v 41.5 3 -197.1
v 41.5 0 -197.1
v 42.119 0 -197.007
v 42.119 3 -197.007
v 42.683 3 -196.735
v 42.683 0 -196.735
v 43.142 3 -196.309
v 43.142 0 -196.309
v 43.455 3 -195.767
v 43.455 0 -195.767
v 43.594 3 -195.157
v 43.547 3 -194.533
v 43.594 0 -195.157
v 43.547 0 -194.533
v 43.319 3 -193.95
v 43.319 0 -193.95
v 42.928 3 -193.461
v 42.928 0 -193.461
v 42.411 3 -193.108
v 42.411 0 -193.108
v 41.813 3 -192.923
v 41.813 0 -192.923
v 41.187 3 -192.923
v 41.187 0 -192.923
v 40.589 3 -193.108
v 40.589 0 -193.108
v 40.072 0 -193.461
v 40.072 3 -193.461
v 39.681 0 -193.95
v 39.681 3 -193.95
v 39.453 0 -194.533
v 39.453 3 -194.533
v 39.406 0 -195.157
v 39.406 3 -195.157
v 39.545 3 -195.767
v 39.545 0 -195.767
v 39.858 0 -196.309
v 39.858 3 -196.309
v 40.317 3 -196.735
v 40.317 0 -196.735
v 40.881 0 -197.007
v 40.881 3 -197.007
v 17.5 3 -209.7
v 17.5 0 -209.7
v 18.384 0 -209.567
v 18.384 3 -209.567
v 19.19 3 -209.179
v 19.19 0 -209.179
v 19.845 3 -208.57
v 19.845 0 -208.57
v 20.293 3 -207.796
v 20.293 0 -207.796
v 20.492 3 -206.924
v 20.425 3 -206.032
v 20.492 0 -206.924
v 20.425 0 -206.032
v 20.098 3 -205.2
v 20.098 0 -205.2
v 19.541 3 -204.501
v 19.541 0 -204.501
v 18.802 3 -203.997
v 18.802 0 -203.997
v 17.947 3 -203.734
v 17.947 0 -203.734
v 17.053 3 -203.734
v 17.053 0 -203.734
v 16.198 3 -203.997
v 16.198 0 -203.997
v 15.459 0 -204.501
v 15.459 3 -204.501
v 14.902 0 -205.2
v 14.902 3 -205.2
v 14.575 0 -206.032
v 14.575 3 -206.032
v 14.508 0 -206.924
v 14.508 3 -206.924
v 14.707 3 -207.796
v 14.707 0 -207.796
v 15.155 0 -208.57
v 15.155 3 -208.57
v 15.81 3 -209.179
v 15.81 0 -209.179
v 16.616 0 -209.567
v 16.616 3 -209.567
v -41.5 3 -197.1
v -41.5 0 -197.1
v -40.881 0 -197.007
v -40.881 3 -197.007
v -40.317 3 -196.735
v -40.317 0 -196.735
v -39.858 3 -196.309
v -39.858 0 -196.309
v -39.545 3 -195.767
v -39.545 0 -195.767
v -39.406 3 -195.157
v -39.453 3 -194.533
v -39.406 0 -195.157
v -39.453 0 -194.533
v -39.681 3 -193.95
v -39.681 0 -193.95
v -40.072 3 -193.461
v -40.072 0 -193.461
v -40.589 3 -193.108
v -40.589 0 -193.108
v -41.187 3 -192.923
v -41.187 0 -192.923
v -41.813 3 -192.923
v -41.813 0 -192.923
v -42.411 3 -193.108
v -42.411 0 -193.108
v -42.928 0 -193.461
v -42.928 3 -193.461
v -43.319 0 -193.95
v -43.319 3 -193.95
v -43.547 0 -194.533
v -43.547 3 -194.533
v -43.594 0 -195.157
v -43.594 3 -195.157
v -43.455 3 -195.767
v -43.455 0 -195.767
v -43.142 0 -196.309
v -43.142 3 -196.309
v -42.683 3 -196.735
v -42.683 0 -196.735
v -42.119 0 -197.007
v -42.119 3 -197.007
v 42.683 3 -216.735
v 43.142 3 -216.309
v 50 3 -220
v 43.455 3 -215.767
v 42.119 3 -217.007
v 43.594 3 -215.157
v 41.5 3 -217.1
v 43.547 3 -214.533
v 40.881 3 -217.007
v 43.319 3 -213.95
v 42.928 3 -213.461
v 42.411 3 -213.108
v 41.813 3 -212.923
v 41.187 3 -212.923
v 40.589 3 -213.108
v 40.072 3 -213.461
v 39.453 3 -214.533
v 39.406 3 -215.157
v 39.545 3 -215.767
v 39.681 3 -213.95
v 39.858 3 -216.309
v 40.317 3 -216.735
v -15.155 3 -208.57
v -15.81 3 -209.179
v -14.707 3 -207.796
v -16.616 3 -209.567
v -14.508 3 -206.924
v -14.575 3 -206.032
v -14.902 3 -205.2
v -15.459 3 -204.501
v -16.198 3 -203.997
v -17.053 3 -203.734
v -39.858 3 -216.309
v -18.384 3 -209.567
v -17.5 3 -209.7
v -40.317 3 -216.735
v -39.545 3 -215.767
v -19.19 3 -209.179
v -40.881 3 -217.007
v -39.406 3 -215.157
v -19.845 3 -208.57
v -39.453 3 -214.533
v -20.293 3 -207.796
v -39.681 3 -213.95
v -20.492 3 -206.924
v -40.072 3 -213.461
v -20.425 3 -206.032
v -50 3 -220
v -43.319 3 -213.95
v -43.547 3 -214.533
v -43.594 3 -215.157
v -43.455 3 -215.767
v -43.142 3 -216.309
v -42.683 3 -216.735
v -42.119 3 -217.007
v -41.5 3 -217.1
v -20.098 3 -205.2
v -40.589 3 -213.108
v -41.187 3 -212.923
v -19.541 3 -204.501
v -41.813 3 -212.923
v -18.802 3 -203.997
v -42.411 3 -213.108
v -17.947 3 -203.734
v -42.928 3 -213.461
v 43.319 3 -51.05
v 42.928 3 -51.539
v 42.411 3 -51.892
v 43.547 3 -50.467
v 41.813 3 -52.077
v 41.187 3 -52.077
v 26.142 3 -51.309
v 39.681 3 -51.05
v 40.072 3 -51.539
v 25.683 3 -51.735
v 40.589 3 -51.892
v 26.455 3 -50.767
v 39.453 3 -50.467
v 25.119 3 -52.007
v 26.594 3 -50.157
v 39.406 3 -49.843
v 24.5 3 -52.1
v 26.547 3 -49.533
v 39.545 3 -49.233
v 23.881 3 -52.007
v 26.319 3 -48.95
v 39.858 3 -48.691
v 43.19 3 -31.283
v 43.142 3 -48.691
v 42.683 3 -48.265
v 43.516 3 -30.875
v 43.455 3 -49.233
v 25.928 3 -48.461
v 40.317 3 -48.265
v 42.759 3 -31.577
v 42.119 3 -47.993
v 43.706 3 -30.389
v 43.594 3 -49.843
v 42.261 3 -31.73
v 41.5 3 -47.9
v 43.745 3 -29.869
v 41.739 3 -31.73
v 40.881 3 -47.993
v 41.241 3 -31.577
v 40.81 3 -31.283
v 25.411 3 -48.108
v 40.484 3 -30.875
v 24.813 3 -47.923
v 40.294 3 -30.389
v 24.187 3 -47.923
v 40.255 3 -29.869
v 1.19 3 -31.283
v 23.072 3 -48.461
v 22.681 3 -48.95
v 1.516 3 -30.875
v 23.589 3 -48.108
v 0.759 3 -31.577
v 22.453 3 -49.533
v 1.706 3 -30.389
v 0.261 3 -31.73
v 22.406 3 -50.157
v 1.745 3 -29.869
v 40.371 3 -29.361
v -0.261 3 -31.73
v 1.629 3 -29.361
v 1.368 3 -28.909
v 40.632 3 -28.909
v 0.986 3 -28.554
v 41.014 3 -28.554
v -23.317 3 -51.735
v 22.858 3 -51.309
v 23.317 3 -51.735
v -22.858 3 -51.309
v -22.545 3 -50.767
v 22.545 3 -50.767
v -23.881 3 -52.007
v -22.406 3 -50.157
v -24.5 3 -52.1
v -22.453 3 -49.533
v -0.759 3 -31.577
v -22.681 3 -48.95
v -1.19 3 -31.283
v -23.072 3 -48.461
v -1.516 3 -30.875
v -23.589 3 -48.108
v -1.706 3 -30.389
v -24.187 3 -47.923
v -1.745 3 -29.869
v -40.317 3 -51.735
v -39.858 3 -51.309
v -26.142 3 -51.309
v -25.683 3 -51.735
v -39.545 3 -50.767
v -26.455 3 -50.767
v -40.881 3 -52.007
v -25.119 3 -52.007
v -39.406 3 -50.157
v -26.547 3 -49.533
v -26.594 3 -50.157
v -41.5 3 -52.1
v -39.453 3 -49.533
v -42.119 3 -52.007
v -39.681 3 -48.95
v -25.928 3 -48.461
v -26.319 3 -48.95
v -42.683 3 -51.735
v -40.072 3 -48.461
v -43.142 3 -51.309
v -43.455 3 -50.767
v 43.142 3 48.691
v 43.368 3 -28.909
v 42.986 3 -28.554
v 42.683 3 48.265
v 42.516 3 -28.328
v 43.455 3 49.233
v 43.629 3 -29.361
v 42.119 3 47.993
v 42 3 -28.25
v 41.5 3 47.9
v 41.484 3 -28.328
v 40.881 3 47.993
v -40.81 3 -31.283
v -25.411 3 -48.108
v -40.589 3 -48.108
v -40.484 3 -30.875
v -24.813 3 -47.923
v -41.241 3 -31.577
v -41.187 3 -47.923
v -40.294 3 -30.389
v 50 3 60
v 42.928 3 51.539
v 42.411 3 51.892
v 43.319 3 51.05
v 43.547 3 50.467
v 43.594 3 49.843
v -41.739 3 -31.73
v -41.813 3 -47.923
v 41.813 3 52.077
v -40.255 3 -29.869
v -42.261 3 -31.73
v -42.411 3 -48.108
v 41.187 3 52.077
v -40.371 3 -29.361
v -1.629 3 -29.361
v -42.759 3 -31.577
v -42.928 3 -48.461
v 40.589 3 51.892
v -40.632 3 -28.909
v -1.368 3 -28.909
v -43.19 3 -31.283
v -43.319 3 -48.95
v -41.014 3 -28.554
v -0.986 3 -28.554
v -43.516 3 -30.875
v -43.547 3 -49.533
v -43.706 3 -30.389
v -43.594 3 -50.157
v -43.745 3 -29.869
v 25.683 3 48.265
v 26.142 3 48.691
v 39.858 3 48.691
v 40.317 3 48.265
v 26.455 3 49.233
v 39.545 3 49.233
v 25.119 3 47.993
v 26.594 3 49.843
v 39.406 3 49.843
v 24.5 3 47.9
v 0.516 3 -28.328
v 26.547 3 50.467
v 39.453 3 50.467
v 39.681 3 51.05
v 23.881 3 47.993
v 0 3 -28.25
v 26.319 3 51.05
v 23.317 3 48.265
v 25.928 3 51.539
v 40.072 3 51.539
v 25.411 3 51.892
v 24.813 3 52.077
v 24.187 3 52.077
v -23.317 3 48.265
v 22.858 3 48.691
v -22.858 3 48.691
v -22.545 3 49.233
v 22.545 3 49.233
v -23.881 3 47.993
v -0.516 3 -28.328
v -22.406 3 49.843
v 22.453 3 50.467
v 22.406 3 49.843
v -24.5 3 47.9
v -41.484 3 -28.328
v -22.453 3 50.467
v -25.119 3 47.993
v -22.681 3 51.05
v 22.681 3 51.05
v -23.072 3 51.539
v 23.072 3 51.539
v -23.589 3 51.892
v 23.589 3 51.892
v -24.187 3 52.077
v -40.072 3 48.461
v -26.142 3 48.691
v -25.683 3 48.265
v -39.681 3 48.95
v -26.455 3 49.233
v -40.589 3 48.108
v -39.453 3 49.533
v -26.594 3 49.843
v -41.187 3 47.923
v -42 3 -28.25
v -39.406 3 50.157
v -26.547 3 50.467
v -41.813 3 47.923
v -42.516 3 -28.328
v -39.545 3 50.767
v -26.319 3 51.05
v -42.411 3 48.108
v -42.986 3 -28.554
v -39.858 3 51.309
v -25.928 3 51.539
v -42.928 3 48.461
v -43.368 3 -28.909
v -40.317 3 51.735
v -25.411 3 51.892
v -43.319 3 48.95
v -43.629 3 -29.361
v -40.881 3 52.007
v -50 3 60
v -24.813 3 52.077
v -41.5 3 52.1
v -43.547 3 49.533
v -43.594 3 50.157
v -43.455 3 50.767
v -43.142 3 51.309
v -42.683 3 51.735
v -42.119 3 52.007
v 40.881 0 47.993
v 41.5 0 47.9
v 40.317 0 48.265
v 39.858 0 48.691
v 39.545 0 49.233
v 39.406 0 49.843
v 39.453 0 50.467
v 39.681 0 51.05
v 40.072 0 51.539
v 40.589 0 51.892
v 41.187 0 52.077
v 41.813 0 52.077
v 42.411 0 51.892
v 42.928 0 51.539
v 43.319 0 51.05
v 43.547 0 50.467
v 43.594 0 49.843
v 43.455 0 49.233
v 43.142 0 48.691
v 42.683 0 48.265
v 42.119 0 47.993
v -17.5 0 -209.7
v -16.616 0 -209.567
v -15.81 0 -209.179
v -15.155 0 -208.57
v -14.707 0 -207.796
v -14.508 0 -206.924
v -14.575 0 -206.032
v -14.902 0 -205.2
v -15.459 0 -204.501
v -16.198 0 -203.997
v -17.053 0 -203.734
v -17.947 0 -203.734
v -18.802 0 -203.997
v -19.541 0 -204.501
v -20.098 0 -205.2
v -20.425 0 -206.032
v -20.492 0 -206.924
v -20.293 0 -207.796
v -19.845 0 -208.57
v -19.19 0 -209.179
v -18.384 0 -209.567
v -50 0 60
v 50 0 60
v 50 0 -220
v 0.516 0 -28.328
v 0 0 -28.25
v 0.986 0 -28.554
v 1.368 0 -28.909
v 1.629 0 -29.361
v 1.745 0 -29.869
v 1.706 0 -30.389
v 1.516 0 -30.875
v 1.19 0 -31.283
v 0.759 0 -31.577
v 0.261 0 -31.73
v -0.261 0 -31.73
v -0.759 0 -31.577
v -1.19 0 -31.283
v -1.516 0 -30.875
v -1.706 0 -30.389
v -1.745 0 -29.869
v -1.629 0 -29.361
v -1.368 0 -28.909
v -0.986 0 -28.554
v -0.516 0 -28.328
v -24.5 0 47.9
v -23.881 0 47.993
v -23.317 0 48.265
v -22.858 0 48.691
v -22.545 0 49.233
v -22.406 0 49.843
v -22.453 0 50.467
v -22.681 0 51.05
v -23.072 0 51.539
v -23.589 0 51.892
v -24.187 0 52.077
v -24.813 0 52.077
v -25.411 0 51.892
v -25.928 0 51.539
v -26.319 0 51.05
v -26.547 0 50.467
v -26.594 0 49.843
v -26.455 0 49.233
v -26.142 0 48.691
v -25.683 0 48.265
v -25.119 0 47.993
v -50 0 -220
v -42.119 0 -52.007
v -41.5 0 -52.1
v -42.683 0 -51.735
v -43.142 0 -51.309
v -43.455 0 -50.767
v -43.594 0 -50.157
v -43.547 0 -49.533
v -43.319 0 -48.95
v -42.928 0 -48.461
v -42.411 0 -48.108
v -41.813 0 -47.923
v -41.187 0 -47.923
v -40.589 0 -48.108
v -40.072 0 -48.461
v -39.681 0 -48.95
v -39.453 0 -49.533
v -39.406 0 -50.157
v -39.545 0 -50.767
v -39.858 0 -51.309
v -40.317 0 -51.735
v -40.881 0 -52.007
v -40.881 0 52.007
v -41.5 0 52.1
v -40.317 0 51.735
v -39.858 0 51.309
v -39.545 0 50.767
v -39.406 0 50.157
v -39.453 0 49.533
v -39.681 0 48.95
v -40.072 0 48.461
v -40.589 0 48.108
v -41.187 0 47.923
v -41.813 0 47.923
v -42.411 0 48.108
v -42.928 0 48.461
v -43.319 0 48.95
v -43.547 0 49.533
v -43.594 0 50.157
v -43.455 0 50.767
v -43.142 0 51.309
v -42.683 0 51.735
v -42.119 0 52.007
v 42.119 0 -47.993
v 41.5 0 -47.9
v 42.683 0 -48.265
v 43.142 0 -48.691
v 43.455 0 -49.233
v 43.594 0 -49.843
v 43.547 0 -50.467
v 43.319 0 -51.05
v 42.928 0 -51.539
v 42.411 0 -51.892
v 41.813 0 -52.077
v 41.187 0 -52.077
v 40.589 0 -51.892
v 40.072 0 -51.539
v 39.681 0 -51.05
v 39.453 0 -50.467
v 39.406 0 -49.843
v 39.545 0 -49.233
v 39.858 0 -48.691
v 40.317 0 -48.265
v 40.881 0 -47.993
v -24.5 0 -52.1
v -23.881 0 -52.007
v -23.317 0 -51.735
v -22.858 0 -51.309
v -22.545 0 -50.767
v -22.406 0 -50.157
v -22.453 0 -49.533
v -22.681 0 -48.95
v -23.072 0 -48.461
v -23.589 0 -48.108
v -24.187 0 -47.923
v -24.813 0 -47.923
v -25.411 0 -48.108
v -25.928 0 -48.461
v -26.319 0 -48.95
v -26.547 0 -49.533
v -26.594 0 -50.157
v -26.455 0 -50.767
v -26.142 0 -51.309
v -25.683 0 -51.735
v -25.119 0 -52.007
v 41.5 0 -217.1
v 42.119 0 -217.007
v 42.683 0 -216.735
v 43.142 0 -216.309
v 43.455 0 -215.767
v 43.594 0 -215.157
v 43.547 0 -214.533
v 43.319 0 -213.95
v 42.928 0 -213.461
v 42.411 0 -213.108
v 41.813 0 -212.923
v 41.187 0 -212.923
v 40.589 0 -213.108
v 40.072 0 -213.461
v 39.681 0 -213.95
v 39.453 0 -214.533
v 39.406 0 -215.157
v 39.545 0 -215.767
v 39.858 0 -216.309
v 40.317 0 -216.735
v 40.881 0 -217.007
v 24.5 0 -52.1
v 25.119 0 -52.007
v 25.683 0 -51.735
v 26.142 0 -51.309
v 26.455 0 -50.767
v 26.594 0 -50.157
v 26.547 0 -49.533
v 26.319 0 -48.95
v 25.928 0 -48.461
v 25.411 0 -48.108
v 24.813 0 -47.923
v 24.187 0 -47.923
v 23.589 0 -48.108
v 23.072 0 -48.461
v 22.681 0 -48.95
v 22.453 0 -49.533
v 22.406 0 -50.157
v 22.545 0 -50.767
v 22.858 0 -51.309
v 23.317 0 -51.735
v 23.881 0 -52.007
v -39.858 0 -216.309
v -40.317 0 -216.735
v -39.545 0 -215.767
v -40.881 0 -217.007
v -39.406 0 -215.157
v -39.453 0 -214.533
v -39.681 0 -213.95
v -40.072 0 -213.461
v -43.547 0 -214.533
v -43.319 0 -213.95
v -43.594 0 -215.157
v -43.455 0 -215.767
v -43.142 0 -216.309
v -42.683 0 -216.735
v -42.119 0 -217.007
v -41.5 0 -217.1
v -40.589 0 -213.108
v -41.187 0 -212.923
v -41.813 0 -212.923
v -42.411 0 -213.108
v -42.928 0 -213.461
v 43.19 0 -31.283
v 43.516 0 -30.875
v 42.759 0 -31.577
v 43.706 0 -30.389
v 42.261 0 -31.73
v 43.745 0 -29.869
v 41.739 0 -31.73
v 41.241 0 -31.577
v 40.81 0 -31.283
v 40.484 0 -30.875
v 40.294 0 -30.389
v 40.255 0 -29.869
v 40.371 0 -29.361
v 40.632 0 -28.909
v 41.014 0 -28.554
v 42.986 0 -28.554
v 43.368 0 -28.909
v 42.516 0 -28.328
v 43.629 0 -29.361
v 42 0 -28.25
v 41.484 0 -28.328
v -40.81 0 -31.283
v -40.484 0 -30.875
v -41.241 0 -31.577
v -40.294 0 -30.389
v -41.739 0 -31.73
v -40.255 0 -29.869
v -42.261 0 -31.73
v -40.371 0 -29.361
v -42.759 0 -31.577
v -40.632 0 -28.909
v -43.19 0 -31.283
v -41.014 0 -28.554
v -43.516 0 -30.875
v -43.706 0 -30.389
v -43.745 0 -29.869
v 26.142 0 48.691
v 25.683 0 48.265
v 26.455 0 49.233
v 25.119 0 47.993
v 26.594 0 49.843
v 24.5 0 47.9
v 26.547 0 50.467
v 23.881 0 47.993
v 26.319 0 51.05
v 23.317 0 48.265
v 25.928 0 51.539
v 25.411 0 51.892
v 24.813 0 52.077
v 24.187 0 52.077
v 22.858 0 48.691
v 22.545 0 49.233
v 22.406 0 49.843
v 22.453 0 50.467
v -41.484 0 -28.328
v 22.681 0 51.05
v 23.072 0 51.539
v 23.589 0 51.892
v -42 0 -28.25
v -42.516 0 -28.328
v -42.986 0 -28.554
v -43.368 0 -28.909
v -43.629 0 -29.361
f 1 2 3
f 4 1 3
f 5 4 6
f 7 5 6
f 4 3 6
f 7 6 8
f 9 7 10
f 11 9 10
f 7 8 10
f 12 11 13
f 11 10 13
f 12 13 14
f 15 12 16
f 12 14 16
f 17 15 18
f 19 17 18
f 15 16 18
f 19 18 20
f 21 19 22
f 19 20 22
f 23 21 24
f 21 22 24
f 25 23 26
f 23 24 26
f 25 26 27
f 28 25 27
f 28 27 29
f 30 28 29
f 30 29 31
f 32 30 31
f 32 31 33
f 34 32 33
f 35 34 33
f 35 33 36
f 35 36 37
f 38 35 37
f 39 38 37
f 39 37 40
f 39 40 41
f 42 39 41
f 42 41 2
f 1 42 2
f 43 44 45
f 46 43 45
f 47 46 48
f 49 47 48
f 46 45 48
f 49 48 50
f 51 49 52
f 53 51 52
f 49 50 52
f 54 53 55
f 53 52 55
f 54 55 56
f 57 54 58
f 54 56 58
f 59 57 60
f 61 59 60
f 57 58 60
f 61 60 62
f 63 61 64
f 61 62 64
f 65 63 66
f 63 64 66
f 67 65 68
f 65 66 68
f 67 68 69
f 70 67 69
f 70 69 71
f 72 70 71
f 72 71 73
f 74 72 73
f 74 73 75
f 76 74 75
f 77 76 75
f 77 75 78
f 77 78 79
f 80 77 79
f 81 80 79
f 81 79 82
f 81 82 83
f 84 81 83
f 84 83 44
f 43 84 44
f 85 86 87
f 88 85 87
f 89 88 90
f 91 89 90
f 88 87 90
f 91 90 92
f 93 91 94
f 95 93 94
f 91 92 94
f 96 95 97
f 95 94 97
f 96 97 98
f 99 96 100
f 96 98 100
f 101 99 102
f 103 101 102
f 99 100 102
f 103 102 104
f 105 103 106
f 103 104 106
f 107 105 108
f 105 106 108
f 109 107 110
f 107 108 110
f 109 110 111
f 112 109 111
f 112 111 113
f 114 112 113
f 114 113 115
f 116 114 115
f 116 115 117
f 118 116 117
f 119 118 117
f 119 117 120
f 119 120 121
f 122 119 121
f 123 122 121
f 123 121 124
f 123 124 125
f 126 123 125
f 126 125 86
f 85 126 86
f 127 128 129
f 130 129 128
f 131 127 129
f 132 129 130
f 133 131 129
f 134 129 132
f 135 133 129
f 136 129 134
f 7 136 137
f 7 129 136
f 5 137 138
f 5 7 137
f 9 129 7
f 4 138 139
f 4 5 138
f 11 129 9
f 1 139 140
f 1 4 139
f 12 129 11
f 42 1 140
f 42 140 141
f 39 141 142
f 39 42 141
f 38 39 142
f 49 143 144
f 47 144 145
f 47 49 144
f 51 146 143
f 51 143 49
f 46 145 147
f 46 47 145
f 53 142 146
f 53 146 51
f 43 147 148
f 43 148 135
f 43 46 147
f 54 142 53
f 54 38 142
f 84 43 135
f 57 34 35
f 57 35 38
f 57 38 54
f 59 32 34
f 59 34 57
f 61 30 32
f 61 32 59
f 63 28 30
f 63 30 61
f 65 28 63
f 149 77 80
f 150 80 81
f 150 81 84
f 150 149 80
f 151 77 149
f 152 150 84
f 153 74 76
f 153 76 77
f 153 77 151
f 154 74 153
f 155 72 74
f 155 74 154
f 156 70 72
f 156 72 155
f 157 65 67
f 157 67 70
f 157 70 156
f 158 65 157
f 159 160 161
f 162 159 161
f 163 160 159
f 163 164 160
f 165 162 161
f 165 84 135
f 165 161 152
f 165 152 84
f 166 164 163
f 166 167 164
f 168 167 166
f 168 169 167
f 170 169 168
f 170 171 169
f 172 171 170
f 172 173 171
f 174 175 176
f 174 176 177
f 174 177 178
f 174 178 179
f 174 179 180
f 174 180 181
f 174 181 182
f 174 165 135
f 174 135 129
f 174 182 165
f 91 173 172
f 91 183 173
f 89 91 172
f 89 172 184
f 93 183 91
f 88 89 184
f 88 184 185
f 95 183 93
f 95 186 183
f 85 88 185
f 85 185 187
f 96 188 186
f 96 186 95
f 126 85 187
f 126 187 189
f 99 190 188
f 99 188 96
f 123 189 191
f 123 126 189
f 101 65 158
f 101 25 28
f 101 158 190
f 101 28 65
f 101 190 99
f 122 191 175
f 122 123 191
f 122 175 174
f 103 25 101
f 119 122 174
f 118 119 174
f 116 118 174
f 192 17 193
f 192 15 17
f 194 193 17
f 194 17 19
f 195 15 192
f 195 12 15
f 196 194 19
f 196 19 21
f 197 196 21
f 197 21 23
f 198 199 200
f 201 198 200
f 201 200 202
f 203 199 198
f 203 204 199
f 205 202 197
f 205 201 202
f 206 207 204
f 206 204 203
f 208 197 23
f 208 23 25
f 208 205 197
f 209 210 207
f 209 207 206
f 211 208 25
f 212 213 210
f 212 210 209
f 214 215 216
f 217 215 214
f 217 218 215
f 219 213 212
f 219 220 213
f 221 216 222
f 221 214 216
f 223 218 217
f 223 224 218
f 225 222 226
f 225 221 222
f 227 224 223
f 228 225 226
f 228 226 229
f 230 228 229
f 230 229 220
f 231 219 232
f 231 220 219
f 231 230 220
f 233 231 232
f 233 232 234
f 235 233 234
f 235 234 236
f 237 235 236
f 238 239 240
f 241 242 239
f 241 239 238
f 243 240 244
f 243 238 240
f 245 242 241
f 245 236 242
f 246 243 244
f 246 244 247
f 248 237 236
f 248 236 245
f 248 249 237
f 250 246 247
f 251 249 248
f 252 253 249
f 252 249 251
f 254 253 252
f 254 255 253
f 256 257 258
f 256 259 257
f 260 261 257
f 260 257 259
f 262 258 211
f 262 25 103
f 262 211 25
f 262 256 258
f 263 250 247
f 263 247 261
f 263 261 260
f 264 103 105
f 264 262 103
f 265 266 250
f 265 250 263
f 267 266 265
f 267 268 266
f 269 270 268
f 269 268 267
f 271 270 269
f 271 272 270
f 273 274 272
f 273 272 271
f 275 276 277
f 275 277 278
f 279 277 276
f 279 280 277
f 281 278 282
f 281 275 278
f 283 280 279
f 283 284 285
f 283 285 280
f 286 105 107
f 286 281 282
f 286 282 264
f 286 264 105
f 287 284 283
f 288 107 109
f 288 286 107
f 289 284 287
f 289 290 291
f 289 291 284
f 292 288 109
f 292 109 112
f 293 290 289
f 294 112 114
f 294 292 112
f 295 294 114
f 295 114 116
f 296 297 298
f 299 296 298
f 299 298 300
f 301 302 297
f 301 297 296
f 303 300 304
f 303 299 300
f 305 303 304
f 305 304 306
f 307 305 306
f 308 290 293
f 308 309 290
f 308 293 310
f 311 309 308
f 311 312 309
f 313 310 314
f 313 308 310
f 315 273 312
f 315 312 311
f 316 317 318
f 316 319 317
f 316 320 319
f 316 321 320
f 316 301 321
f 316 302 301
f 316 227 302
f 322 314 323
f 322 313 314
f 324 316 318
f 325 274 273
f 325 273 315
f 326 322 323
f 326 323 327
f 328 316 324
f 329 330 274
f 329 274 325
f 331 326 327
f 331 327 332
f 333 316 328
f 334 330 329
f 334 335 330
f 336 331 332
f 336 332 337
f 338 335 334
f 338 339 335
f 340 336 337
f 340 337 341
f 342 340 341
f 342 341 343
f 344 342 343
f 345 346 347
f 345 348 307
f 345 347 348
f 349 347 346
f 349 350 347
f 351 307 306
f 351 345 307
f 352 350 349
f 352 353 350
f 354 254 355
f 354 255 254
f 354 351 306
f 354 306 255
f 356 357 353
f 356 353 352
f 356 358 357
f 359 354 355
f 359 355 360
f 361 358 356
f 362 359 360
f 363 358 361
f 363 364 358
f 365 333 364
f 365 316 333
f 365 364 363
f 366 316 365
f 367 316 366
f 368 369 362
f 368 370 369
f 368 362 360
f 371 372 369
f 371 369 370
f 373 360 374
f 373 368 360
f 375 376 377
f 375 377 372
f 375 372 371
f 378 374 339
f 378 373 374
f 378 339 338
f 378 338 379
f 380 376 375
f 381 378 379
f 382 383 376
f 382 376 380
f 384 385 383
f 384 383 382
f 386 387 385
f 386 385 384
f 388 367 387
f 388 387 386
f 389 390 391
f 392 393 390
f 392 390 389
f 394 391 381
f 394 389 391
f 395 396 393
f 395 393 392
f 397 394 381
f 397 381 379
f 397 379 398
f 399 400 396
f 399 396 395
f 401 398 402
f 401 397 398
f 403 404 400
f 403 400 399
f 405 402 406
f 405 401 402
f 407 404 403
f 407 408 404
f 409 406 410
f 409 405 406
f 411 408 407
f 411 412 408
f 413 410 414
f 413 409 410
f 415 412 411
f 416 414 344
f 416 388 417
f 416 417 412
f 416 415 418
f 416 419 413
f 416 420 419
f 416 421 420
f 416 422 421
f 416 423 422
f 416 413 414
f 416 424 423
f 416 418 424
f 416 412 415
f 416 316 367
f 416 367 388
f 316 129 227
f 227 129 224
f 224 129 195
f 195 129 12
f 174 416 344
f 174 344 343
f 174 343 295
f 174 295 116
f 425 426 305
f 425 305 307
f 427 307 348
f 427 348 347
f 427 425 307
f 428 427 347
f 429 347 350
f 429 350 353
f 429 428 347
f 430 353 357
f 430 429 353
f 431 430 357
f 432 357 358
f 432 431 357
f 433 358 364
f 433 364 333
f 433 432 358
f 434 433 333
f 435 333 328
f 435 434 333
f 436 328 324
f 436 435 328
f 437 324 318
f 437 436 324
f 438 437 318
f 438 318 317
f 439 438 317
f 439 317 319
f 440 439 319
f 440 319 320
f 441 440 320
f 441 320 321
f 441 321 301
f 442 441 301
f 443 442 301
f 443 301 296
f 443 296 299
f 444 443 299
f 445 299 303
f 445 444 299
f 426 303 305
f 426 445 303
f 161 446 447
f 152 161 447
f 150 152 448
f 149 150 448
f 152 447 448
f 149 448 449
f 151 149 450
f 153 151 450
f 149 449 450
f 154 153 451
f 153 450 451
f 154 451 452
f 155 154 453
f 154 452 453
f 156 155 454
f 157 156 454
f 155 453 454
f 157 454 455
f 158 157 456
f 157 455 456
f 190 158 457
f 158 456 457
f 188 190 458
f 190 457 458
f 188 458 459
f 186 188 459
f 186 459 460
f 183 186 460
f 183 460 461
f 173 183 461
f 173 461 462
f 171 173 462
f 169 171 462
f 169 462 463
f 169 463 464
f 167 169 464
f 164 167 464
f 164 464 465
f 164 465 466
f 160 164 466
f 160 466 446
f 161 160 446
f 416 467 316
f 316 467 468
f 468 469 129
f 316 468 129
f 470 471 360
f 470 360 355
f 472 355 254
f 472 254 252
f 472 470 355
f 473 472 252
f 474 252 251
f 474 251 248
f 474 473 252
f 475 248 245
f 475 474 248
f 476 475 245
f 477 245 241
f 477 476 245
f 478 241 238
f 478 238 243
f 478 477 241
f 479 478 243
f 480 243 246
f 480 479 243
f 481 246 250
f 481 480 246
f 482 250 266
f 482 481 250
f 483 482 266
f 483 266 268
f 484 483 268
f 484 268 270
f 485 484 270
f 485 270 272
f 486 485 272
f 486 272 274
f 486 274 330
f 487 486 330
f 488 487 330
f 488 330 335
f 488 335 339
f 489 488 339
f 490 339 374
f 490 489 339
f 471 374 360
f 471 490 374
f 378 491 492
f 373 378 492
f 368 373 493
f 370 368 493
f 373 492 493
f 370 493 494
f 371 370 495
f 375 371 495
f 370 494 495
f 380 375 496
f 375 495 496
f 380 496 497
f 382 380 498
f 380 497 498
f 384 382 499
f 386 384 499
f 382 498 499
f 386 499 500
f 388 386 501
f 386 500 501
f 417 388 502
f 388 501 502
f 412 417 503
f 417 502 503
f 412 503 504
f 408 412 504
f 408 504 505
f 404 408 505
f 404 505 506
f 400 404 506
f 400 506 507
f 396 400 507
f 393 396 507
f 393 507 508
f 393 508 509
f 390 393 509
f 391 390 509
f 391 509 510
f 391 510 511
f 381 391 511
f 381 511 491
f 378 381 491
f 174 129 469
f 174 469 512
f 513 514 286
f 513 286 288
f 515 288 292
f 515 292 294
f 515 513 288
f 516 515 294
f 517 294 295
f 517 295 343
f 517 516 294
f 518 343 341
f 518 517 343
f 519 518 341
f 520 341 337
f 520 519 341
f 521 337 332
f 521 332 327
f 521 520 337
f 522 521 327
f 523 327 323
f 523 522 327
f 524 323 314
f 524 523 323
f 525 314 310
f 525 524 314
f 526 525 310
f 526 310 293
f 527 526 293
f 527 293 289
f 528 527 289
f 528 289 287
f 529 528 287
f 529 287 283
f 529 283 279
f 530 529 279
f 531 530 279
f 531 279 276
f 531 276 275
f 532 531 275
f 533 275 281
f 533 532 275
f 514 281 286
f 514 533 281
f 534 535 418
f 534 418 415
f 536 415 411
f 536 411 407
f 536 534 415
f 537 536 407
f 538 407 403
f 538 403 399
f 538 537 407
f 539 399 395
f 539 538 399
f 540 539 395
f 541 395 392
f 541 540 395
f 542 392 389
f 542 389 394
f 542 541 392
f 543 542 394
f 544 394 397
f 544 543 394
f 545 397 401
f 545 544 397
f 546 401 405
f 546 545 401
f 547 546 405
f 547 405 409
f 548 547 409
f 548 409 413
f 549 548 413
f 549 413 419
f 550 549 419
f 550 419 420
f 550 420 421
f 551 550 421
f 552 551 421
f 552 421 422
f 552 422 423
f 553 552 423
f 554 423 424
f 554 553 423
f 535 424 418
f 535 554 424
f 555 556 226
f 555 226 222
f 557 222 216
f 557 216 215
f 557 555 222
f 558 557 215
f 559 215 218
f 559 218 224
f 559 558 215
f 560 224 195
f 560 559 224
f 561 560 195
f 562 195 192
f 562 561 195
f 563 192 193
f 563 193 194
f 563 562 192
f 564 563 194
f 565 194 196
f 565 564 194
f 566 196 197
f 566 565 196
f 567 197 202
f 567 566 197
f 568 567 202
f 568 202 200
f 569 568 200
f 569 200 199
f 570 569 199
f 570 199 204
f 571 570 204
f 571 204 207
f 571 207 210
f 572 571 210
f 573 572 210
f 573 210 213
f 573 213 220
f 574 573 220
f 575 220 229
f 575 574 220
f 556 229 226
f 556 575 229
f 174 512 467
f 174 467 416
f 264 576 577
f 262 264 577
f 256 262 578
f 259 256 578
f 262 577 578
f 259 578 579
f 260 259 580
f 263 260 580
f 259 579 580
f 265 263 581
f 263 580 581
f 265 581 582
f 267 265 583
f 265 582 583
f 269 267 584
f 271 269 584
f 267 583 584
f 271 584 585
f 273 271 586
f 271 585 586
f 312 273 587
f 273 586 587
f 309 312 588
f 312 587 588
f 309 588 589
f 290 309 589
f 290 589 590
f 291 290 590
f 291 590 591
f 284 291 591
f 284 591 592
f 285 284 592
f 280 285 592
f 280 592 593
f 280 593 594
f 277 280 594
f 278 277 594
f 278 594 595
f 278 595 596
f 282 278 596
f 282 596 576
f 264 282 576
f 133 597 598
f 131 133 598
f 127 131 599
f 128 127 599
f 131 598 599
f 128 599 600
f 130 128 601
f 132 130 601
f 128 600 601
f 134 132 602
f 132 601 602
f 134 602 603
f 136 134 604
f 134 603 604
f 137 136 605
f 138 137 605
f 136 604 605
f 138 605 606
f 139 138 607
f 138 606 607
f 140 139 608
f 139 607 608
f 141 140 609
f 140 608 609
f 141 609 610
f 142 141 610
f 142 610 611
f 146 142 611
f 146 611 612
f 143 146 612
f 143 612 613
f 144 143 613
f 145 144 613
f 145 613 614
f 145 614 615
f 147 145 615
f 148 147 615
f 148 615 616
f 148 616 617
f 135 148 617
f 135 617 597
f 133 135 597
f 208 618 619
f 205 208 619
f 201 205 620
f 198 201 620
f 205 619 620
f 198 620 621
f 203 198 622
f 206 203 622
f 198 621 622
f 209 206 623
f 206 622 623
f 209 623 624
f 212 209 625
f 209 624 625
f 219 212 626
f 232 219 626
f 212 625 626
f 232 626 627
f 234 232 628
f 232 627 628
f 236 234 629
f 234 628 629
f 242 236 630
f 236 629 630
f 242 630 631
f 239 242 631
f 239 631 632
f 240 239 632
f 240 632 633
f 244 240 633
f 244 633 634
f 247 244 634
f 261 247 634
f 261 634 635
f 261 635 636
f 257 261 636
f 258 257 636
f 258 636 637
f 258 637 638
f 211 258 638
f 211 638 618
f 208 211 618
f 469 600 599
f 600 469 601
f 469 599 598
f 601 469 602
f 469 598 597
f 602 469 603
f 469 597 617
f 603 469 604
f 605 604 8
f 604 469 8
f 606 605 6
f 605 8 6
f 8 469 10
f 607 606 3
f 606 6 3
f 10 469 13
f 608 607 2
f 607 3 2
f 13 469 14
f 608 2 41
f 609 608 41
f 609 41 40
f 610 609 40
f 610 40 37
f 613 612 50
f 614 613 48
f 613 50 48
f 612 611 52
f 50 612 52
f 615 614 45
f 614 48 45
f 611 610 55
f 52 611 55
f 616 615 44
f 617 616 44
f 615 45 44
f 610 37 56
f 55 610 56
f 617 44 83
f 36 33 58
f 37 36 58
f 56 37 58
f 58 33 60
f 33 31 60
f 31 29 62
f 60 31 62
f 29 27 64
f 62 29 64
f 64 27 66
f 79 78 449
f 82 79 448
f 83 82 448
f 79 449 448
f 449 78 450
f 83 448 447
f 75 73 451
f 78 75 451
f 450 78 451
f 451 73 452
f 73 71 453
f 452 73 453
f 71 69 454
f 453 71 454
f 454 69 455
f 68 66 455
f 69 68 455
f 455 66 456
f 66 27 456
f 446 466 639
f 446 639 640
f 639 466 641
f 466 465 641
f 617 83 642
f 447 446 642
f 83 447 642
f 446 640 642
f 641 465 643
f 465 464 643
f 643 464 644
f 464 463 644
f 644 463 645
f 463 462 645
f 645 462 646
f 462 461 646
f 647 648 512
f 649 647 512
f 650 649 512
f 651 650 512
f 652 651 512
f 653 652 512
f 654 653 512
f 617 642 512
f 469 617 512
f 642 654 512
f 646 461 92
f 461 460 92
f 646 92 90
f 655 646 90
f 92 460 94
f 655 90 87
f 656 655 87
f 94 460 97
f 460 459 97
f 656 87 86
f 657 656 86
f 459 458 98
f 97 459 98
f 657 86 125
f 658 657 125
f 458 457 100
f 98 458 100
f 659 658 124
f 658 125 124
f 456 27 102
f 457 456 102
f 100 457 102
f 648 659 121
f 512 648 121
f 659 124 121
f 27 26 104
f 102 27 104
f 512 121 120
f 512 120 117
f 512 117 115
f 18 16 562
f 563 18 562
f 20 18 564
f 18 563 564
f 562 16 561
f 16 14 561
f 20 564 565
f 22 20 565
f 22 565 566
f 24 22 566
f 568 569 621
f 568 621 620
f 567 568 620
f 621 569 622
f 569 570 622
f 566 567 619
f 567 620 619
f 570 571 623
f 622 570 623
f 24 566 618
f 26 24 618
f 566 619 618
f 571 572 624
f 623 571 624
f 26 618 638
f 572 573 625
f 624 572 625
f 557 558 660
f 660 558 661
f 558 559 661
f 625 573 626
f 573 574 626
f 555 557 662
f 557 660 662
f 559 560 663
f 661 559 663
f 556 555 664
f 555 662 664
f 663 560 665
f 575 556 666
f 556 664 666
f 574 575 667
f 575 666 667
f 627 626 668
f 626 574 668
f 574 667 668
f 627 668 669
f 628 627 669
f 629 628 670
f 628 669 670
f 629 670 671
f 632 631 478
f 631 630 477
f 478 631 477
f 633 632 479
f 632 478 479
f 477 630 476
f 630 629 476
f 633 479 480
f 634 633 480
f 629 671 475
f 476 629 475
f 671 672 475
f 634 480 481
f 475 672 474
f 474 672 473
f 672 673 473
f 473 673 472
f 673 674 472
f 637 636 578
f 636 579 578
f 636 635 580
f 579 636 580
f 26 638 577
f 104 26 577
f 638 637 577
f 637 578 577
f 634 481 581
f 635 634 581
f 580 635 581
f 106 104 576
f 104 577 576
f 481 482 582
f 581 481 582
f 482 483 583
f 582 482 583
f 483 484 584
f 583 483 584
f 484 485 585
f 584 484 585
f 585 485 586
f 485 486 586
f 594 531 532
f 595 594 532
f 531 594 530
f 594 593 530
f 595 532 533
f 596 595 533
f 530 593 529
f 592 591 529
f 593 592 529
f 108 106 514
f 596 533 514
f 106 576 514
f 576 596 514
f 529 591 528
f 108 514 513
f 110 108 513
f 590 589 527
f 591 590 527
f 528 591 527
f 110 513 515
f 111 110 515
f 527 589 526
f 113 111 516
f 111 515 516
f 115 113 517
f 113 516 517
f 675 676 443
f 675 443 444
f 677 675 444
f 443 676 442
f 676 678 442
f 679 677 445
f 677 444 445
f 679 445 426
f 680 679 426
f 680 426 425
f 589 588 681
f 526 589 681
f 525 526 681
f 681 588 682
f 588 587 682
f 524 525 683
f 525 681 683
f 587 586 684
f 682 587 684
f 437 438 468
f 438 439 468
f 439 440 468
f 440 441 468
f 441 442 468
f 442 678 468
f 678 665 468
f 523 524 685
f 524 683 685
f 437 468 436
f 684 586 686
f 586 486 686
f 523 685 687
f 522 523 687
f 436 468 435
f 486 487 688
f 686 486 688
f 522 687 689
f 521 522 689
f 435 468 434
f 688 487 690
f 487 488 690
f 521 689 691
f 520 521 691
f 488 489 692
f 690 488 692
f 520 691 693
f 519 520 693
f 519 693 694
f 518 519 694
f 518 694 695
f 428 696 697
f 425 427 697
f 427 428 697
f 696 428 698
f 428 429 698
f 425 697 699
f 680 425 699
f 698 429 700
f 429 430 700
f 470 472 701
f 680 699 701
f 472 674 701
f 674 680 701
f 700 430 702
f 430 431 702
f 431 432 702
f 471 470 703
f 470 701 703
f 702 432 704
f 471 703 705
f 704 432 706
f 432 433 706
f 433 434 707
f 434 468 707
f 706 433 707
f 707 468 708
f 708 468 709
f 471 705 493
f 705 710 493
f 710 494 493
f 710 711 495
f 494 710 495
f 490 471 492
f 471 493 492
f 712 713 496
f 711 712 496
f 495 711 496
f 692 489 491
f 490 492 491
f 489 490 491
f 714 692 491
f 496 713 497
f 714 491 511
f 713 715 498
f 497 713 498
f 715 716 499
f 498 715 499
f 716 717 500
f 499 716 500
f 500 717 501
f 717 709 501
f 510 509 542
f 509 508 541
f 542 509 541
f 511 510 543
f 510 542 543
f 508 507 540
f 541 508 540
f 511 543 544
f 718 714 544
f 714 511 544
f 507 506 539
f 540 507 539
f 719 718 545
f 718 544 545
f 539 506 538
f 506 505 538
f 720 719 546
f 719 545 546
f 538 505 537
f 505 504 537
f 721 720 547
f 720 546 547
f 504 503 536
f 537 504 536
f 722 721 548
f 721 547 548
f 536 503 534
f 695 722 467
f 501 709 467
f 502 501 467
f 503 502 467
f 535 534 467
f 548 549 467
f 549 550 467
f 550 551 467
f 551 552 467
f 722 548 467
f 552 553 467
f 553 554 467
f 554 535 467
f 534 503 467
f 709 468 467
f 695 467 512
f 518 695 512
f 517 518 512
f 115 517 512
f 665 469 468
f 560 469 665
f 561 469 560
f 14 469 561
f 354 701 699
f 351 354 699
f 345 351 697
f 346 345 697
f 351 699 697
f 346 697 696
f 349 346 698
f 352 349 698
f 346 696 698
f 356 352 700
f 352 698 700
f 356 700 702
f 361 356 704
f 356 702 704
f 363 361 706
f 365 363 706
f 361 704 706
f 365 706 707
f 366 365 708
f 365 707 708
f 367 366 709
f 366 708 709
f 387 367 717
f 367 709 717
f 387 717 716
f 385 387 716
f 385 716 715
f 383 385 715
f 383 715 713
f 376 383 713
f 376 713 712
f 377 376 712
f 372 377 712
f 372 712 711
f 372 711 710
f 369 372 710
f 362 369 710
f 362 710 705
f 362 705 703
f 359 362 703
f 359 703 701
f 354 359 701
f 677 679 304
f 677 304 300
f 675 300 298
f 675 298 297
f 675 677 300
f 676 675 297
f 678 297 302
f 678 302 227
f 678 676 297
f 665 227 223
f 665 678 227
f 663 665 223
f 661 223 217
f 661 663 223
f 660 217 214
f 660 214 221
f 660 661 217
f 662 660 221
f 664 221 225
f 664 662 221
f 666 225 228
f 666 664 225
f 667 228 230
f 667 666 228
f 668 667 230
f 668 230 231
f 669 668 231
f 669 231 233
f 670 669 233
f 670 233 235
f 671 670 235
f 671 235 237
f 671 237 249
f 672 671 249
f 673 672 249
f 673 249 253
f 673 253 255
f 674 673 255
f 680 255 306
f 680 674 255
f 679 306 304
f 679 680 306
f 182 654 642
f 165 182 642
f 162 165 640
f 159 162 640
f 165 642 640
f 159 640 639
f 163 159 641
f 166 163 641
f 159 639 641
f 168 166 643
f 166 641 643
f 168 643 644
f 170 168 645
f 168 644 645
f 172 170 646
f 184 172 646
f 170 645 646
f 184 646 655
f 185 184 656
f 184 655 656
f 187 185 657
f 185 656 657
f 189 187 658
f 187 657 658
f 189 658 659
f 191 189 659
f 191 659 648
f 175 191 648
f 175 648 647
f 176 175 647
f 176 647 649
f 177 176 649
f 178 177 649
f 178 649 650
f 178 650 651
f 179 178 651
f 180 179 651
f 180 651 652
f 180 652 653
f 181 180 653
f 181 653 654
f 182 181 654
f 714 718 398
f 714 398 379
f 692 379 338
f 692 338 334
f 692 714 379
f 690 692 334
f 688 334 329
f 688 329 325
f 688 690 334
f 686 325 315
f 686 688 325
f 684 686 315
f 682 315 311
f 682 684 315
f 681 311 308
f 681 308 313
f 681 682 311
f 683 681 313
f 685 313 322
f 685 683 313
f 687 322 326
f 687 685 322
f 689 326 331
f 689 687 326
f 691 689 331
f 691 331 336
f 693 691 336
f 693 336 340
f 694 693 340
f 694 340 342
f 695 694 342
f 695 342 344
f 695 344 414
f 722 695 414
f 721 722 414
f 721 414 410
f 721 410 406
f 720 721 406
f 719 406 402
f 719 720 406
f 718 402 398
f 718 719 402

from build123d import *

# Parameters (mm, degrees)
SKETCH1_W           = 100
SKETCH1_H           = 120
SKETCH1_R           = 2.1
SKETCH1_R_2         = 1.75
BOSS_EXTRUDE1_DEPTH = 3
SKETCH2_R           = 2.1
CUT_EXTRUDE1_DEPTH  = 10
SKETCH3_W           = 100
SKETCH3_H           = 3
BOSS_EXTRUDE2_DEPTH = 160
SKETCH4_R           = 3
SKETCH4_R_2         = 2.1
CUT_EXTRUDE2_DEPTH  = 160


with BuildPart() as part:
    # Sketch1 → Boss-Extrude1 (new body)
    with BuildSketch(Plane(origin=(0, 0, 0), x_dir=(1, 0, 0), z_dir=(0, 1, 0))):
        Rectangle(SKETCH1_W, SKETCH1_H)
        with Locations(Location((41.5, 50, 0), (0, 0, 270))):
            Circle(SKETCH1_R, mode=Mode.SUBTRACT)
        with Locations(Location((41.5, -50, 0), (0, 0, 90))):
            Circle(SKETCH1_R, mode=Mode.SUBTRACT)
        with Locations(Location((-41.5, -50, 0), (0, 0, 270))):
            Circle(SKETCH1_R, mode=Mode.SUBTRACT)
        with Locations(Location((-41.5, 50, 0), (0, 0, 90))):
            Circle(SKETCH1_R, mode=Mode.SUBTRACT)
        with Locations(Location((-42, 30, 0), (0, 0, 270))):
            Circle(SKETCH1_R_2, mode=Mode.SUBTRACT)
        with Locations(Location((0, 30, 0), (0, 0, 270))):
            Circle(SKETCH1_R_2, mode=Mode.SUBTRACT)
        with Locations(Location((42, 30, 0), (0, 0, 270))):
            Circle(SKETCH1_R_2, mode=Mode.SUBTRACT)
    extrude(amount=BOSS_EXTRUDE1_DEPTH)

    # Sketch2 → Cut-Extrude1 (cut)
    with BuildSketch(Plane.XZ):
        with Locations(Location((-24.5, -50, 0), (0, 0, 270))):
            Circle(SKETCH2_R)
        with Locations(Location((24.5, -50, 0), (0, 0, 270))):
            Circle(SKETCH2_R)
        with Locations(Location((24.5, 50, 0), (0, 0, 270))):
            Circle(SKETCH2_R)
        with Locations(Location((-24.5, 50, 0), (0, 0, 270))):
            Circle(SKETCH2_R)
    extrude(amount=-CUT_EXTRUDE1_DEPTH, mode=Mode.SUBTRACT)

    # Sketch3 → Boss-Extrude2 (add)
    with BuildSketch(Plane(origin=(0, 0, -60), x_dir=(-1, 0, 0), z_dir=(0, 0, -1))):
        with Locations((0, 1.5)):
            Rectangle(SKETCH3_W, SKETCH3_H)
    extrude(amount=BOSS_EXTRUDE2_DEPTH)

    # Sketch4 → Cut-Extrude2 (cut)
    with BuildSketch(Plane.XZ):
        with Locations(Location((17.5, -206.7, 0), (0, 0, 270))):
            Circle(SKETCH4_R)
        with Locations(Location((-17.5, -206.7, 0), (0, 0, 270))):
            Circle(SKETCH4_R)
        with Locations(Location((-41.5, -215, 0), (0, 0, 270))):
            Circle(SKETCH4_R_2)
        with Locations(Location((-41.5, -195, 0), (0, 0, 270))):
            Circle(SKETCH4_R_2)
        with Locations(Location((41.5, -195, 0), (0, 0, 270))):
            Circle(SKETCH4_R_2)
        with Locations(Location((41.5, -215, 0), (0, 0, 270))):
            Circle(SKETCH4_R_2)
    extrude(amount=-CUT_EXTRUDE2_DEPTH, mode=Mode.SUBTRACT)


solid = part.part
